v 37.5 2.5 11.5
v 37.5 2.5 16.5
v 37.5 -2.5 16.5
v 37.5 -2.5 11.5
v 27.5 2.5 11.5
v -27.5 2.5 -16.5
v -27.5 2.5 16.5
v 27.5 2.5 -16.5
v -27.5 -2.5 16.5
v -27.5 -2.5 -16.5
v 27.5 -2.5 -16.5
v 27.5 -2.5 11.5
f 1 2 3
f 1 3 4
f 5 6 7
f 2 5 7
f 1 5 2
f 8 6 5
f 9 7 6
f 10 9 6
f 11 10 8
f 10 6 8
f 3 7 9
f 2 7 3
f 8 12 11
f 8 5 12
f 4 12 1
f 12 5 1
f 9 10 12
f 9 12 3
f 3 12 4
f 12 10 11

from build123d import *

# Parameters (mm, degrees)
SKETCH1_W           = 55
SKETCH1_H           = 33
SKETCH1_W_2         = 10
SKETCH1_H_2         = 5
BOSS_EXTRUDE1_DEPTH = 2.5


with BuildPart() as part:
    # Sketch1 → Boss-Extrude1 (new body, symmetric)
    with BuildSketch(Plane(origin=(0, 0, 0), x_dir=(1, 0, 0), z_dir=(0, 1, 0))):
        Rectangle(SKETCH1_W, SKETCH1_H)
        with Locations((32.5, -14)):
            Rectangle(SKETCH1_W_2, SKETCH1_H_2)
    extrude(amount=BOSS_EXTRUDE1_DEPTH, both=True)


solid = part.part
